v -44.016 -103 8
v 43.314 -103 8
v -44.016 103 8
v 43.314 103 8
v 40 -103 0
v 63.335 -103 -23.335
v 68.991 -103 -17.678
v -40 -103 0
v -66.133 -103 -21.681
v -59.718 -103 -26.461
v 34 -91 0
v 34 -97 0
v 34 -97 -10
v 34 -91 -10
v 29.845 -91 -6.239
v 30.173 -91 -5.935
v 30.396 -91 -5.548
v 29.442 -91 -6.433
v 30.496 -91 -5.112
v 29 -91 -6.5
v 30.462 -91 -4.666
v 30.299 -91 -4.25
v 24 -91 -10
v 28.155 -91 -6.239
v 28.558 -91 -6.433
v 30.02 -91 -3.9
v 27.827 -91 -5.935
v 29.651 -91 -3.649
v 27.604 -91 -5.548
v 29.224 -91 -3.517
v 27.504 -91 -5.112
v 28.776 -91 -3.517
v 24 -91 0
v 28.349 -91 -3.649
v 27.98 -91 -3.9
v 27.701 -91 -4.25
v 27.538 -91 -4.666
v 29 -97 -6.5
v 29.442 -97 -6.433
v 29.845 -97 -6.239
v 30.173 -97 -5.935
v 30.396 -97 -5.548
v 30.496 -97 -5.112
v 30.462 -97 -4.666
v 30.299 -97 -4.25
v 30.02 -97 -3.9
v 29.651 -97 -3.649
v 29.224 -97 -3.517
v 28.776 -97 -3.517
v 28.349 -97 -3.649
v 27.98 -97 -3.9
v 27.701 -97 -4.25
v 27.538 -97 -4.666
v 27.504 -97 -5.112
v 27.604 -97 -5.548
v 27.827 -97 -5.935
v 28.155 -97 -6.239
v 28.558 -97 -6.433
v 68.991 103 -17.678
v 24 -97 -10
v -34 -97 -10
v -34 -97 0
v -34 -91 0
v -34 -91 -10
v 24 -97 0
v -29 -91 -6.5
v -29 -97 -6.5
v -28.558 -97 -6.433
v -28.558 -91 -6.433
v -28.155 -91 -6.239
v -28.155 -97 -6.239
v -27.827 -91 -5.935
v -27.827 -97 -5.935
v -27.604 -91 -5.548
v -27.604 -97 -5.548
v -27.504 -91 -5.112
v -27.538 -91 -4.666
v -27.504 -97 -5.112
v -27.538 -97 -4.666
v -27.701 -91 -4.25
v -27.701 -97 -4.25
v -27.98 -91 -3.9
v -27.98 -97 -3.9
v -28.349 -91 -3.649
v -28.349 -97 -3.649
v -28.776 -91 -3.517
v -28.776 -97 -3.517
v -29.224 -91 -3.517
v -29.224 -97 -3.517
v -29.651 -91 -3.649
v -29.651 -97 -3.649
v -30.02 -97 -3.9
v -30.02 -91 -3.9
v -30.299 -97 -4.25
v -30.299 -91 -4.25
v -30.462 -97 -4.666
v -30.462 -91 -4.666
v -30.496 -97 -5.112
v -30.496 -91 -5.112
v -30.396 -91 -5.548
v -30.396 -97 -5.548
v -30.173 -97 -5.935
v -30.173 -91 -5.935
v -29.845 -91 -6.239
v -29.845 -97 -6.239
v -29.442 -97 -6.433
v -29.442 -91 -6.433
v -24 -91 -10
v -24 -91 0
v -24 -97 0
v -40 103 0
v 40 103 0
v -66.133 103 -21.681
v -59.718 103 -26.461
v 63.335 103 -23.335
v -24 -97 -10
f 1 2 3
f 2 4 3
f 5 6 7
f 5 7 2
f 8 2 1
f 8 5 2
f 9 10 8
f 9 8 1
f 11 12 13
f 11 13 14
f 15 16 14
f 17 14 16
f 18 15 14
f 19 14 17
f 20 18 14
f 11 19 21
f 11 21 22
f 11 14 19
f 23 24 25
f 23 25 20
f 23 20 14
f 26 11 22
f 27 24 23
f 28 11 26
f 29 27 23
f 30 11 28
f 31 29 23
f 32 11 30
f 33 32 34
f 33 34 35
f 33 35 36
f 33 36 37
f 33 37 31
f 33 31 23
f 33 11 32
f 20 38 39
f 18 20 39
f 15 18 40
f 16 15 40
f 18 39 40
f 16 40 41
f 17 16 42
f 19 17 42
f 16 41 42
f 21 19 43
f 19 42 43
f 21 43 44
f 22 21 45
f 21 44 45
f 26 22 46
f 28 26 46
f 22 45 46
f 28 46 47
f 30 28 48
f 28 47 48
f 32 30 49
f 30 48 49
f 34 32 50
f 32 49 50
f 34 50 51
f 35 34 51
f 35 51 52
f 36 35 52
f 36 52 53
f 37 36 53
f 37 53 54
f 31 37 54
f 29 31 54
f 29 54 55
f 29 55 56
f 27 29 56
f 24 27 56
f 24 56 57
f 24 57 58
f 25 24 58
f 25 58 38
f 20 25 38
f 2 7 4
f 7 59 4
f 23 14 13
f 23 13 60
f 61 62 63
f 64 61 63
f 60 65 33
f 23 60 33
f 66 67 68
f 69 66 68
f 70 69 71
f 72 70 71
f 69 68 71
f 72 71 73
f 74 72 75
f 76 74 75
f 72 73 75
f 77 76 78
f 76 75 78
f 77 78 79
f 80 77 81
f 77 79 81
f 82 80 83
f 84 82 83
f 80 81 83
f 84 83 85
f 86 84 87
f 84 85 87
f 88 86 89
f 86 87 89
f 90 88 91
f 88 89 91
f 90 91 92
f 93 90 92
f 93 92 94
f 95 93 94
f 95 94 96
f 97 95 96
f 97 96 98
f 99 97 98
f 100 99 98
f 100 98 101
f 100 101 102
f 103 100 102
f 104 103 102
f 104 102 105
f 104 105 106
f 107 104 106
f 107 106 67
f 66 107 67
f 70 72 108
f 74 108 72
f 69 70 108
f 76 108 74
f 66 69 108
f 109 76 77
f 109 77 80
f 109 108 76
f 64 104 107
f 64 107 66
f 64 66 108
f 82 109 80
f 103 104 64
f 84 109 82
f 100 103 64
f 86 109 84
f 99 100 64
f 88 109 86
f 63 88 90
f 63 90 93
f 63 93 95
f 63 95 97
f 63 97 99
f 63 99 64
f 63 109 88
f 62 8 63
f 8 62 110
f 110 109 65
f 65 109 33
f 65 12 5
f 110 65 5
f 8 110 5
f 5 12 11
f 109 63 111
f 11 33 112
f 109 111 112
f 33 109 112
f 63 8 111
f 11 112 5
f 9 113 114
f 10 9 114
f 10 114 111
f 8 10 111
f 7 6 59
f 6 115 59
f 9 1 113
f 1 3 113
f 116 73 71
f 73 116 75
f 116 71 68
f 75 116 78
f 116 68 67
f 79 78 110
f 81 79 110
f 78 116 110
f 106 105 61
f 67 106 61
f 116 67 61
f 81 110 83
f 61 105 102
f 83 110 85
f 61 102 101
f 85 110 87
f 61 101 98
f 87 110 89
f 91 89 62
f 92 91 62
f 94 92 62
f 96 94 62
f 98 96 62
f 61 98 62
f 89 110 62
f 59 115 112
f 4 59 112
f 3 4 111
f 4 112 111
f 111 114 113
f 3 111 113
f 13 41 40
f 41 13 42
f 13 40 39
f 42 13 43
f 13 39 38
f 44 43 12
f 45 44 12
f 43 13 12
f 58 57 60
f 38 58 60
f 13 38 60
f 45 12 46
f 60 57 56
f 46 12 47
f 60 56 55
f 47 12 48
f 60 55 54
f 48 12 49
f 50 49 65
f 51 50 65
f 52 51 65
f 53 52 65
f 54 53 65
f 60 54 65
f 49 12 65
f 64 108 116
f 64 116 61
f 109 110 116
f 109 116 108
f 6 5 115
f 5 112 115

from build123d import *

# Parameters (mm, degrees)
SALIENTE_EXTRUIR1_DEPTH = 103
CROQUIS2_W              = 10
CROQUIS2_H              = 6
SALIENTE_EXTRUIR2_DEPTH = 10
CROQUIS8_R              = 1.5
CORTAR_EXTRUIR3_DEPTH   = 214.213522317


with BuildPart() as part:
    # Croquis1 → Saliente-Extruir1 (new, symmetric)
    with BuildSketch(Plane(origin=(0, 0, 0), x_dir=(1, 0, 0), z_dir=(0, 1, 0))):
        Polygon((-40, 0), (40, 0), (63.334523779, 23.334523779), (68.991378029, 17.67766953), (43.313708499, -8), (-44.015502165, -8), (-66.132956944, 21.681064581), (-59.718117141, 26.46121419), align=None)
    extrude(amount=SALIENTE_EXTRUIR1_DEPTH, both=True)

    # Croquis2 → Saliente-Extruir2 (add)
    with BuildSketch(Plane(origin=(0, 0, 0), x_dir=(-1, 0, 0), z_dir=(0, 0, -1))):
        with Locations((29, -94)):
            Rectangle(CROQUIS2_W, CROQUIS2_H)
        with Locations((-29, -94)):
            Rectangle(CROQUIS2_W, CROQUIS2_H)
    extrude(amount=SALIENTE_EXTRUIR2_DEPTH)

    # Croquis8 → Cortar-Extruir3 (cut, through all)
    with BuildSketch(Plane.XZ.offset(97)):
        with Locations(Location((29, -5, 0), (0, 0, 270))):
            Circle(CROQUIS8_R)
        with Locations(Location((-29, -5, 0), (0, 0, 270))):
            Circle(CROQUIS8_R)
    extrude(amount=-CORTAR_EXTRUIR3_DEPTH, mode=Mode.SUBTRACT)


solid = part.part
